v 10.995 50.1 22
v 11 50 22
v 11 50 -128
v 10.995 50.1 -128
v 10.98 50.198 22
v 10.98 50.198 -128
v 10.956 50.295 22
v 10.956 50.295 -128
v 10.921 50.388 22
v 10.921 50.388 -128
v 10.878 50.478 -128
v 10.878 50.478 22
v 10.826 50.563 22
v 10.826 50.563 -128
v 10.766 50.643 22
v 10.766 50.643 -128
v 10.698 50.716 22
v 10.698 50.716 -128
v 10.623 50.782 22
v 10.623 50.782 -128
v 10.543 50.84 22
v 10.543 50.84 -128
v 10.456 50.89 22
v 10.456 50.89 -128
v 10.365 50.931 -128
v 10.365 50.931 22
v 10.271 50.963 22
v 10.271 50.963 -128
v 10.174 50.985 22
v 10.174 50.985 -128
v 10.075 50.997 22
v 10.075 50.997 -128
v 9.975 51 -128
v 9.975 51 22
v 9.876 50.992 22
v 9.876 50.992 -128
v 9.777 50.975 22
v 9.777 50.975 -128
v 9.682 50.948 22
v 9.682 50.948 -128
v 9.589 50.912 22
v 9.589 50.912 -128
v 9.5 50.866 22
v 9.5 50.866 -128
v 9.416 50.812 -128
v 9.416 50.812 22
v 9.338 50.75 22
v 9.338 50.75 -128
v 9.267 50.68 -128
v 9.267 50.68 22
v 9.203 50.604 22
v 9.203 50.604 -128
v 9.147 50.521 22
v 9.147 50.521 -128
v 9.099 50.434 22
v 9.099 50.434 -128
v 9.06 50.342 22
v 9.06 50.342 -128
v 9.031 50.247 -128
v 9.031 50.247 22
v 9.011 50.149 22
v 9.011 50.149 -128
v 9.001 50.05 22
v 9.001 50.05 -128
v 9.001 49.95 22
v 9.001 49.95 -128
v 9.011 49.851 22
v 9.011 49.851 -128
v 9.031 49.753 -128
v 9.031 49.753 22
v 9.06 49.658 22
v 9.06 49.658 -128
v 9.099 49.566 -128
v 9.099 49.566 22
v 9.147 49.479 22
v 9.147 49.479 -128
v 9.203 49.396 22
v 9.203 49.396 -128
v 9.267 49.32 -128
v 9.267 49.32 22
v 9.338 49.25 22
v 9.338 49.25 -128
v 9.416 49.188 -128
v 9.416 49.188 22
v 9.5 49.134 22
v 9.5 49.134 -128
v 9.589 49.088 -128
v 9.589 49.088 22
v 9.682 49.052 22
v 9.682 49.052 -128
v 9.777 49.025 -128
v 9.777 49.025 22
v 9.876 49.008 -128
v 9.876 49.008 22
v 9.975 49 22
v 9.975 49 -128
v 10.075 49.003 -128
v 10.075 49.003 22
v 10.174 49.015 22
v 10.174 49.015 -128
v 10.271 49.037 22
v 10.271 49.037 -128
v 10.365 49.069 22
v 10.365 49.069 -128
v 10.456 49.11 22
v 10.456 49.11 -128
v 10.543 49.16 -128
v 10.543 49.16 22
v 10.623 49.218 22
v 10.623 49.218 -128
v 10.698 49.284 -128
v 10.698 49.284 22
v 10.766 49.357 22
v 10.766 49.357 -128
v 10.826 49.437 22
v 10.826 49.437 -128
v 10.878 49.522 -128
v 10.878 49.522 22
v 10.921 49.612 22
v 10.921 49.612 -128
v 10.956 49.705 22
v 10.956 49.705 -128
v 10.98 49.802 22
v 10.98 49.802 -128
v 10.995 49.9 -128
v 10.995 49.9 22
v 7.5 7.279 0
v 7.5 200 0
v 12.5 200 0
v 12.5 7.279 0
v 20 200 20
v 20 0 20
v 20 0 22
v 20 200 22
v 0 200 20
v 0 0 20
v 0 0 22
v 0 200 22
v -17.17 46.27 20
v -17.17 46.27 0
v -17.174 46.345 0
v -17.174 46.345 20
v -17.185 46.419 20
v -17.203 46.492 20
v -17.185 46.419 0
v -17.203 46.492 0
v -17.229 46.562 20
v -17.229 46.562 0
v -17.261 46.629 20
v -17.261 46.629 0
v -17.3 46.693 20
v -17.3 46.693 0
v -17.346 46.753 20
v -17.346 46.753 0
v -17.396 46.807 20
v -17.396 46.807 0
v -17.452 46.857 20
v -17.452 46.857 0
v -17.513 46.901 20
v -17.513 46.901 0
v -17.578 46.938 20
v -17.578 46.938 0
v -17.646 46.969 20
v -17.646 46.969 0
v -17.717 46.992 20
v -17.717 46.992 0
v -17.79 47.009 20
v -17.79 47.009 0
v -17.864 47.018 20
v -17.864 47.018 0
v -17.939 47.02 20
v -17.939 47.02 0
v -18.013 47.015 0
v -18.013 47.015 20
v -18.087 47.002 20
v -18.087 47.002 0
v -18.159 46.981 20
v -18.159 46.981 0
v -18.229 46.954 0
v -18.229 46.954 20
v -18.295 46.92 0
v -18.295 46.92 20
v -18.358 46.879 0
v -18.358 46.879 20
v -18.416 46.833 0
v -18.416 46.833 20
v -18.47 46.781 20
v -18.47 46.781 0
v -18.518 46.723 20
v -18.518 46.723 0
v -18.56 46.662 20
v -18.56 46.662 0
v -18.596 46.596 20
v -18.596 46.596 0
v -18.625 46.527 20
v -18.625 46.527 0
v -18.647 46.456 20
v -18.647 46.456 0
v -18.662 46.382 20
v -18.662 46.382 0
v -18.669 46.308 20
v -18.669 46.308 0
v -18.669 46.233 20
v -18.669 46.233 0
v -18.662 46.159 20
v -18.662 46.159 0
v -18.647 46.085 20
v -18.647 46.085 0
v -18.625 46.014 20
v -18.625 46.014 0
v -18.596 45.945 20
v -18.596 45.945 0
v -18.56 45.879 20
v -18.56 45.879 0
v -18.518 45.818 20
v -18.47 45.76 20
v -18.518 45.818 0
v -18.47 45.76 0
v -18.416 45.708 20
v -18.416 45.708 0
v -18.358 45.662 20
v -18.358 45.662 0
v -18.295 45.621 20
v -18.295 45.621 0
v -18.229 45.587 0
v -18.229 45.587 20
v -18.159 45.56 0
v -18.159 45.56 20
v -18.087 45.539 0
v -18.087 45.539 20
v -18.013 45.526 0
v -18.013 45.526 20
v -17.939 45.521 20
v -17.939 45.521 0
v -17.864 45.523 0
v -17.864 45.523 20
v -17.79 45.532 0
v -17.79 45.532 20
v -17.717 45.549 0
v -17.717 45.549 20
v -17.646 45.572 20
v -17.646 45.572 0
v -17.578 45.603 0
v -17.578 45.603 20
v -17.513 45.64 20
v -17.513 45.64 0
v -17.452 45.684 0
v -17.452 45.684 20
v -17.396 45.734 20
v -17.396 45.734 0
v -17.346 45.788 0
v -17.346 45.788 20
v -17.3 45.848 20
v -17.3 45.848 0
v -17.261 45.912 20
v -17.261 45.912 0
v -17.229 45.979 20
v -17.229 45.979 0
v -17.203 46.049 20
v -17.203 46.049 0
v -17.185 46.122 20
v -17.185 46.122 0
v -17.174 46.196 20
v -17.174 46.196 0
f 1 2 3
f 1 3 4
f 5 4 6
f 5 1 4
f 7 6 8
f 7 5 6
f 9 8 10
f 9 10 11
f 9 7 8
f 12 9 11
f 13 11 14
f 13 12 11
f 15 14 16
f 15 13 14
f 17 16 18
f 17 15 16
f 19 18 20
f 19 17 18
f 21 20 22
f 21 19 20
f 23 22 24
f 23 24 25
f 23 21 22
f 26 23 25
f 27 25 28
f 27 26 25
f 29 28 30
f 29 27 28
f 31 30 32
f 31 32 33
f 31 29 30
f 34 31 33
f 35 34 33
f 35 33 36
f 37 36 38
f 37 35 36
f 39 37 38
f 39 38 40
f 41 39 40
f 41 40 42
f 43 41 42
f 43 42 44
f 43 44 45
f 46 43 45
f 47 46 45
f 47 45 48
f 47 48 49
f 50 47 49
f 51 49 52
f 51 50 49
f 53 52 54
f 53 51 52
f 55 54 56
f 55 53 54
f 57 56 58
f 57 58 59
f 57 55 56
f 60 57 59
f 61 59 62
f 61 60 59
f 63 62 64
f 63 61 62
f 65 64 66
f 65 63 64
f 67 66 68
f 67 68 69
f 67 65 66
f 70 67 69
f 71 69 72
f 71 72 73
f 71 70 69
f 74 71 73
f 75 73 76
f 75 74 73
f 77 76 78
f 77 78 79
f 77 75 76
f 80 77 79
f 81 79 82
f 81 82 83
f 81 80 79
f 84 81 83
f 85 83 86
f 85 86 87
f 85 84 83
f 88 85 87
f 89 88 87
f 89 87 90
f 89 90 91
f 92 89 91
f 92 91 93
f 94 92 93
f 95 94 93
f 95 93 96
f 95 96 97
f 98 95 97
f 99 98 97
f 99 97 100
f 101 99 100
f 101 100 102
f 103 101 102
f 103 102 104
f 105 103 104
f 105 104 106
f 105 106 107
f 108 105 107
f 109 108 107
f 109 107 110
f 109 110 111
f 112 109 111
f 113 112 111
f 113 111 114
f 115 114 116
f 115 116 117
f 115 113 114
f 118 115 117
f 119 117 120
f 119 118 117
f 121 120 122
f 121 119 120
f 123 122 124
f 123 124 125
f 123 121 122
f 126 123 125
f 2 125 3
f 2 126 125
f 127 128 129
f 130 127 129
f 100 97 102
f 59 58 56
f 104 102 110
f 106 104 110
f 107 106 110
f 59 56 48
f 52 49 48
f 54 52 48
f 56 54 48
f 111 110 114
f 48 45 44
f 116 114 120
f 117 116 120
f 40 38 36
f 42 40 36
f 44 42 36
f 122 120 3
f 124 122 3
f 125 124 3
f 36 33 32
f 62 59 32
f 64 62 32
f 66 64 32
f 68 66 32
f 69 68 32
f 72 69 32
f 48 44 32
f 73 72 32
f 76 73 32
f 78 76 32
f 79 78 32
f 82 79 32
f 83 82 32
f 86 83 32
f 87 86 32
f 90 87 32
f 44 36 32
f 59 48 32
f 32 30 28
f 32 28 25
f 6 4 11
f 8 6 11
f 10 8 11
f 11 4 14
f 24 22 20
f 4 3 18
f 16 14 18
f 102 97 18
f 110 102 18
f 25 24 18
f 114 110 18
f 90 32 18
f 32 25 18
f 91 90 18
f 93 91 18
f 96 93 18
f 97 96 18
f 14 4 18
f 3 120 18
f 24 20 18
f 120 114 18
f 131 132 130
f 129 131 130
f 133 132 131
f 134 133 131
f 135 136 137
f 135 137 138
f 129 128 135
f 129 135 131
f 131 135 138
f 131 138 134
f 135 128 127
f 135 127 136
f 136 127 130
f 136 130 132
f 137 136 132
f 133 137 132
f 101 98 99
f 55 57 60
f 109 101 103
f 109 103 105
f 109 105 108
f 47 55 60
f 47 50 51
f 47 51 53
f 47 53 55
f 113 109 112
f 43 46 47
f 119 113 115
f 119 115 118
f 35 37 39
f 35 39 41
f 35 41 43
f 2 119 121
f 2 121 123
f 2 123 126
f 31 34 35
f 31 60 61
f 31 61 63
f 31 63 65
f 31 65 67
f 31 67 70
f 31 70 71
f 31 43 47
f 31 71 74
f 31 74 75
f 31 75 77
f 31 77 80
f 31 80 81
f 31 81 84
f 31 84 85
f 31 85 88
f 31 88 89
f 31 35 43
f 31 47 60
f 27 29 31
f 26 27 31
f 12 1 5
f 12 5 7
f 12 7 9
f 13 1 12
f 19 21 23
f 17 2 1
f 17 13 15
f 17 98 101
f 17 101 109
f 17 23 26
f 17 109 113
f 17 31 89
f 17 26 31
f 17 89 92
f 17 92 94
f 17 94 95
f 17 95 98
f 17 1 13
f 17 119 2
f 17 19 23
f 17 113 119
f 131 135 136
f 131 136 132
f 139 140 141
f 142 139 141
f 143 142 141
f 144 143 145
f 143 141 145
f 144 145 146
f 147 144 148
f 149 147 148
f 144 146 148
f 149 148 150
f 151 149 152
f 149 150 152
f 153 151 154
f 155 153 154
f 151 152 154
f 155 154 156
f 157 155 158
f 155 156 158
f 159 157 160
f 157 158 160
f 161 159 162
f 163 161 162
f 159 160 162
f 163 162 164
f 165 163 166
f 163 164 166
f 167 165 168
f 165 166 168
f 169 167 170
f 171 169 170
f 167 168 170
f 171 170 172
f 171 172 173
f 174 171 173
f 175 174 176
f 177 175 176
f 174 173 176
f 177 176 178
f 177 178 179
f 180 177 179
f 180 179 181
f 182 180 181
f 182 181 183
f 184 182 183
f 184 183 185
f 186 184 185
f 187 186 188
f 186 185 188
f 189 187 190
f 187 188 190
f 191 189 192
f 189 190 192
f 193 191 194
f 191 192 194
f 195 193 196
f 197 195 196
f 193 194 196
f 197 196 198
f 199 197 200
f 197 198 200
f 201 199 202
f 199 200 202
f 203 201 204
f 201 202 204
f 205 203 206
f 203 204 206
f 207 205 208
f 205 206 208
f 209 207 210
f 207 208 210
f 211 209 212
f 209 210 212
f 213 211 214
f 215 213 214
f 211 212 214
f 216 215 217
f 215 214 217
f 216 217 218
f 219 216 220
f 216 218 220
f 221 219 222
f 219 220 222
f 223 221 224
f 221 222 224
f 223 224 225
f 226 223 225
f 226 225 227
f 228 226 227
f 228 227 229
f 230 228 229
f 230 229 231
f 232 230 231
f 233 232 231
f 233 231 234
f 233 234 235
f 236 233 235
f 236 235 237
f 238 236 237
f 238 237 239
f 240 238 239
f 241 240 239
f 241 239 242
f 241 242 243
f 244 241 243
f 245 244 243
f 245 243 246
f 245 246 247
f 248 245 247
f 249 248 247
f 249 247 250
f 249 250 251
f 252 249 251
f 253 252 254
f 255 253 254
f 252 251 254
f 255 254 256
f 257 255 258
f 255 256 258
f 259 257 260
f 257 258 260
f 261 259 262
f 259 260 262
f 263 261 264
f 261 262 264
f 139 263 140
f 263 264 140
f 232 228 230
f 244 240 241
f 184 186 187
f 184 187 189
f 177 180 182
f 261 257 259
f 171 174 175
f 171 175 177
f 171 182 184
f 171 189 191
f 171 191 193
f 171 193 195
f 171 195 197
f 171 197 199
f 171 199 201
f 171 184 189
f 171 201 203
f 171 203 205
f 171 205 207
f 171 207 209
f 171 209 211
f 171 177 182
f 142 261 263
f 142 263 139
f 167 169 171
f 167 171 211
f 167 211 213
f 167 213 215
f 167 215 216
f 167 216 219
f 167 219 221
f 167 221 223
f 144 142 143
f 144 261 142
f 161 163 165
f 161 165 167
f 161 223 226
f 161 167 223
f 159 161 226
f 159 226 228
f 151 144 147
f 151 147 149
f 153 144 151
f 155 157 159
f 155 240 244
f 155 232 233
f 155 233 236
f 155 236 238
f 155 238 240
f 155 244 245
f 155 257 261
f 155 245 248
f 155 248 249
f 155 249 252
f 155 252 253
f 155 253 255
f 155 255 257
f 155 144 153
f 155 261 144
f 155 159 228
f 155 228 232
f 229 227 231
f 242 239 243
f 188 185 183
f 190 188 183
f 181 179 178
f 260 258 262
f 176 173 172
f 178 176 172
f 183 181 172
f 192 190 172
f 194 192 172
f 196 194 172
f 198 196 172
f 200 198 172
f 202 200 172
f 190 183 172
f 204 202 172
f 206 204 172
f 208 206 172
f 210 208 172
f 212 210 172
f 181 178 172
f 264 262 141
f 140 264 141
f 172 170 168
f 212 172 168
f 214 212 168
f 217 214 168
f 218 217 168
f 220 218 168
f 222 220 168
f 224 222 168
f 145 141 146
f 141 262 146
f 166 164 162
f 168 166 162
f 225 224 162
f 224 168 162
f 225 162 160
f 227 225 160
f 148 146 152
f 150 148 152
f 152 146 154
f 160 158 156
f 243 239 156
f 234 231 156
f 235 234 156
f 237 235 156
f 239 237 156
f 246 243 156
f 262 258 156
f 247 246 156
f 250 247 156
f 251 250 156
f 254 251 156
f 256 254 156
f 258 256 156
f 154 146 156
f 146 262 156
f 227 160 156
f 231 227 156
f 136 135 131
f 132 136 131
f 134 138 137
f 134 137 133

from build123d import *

# Parameters (mm, degrees)
F0_W      = 20
F0_H      = 200
F1_DEPTH  = 20
F3_DEPTH  = 200.001
F5_DEPTH  = 20.001
F6_W      = 20
F6_H      = 200
F7_DEPTH  = 2
F8_R      = 1
F9_DEPTH  = 150
F10_R     = 0.75
F11_DEPTH = 20


with BuildPart() as f1:
    # F0 (on Top) → F1 (new body)
    with BuildSketch(Plane.XY):
        with Locations((10, 100)):
            Rectangle(F0_W, F0_H)
    extrude(amount=F1_DEPTH)

    # F2 (on face) → F3 (cut, through all)
    with BuildSketch(Plane.XZ):
        Polygon((7.5, 0), (0, 20), (0, 0), align=None)
        Polygon((20, 20), (12.5, 0), (20, 0), align=None)
    extrude(amount=-F3_DEPTH, mode=Mode.SUBTRACT)

    # F4 (on Right) → F5 (cut, through all)
    with BuildSketch(Plane.YZ):
        Polygon((0, 20), (0, 0), (7.2794046853, 0), align=None)
    extrude(amount=F5_DEPTH, mode=Mode.SUBTRACT)


with BuildPart() as f7:
    # F6 (on face) → F7 (new body)
    with BuildSketch(Plane.XY.offset(20)):
        with Locations((10, 100)):
            Rectangle(F6_W, F6_H)
    extrude(amount=F7_DEPTH)


with BuildPart() as f9:
    # F8 (on face) → F9 (new body)
    with BuildSketch(Plane.XY.offset(22)):
        with Locations((10, 50)):
            Circle(F8_R)
    extrude(amount=-F9_DEPTH)


with BuildPart() as f11:
    # F10 (on Top) → F11 (new body)
    with BuildSketch(Plane.XY):
        with Locations((-17.920082435, 46.270493418)):
            Circle(F10_R)
    extrude(amount=F11_DEPTH)


solid = Compound([f1.part, f7.part, f9.part, f11.part])
